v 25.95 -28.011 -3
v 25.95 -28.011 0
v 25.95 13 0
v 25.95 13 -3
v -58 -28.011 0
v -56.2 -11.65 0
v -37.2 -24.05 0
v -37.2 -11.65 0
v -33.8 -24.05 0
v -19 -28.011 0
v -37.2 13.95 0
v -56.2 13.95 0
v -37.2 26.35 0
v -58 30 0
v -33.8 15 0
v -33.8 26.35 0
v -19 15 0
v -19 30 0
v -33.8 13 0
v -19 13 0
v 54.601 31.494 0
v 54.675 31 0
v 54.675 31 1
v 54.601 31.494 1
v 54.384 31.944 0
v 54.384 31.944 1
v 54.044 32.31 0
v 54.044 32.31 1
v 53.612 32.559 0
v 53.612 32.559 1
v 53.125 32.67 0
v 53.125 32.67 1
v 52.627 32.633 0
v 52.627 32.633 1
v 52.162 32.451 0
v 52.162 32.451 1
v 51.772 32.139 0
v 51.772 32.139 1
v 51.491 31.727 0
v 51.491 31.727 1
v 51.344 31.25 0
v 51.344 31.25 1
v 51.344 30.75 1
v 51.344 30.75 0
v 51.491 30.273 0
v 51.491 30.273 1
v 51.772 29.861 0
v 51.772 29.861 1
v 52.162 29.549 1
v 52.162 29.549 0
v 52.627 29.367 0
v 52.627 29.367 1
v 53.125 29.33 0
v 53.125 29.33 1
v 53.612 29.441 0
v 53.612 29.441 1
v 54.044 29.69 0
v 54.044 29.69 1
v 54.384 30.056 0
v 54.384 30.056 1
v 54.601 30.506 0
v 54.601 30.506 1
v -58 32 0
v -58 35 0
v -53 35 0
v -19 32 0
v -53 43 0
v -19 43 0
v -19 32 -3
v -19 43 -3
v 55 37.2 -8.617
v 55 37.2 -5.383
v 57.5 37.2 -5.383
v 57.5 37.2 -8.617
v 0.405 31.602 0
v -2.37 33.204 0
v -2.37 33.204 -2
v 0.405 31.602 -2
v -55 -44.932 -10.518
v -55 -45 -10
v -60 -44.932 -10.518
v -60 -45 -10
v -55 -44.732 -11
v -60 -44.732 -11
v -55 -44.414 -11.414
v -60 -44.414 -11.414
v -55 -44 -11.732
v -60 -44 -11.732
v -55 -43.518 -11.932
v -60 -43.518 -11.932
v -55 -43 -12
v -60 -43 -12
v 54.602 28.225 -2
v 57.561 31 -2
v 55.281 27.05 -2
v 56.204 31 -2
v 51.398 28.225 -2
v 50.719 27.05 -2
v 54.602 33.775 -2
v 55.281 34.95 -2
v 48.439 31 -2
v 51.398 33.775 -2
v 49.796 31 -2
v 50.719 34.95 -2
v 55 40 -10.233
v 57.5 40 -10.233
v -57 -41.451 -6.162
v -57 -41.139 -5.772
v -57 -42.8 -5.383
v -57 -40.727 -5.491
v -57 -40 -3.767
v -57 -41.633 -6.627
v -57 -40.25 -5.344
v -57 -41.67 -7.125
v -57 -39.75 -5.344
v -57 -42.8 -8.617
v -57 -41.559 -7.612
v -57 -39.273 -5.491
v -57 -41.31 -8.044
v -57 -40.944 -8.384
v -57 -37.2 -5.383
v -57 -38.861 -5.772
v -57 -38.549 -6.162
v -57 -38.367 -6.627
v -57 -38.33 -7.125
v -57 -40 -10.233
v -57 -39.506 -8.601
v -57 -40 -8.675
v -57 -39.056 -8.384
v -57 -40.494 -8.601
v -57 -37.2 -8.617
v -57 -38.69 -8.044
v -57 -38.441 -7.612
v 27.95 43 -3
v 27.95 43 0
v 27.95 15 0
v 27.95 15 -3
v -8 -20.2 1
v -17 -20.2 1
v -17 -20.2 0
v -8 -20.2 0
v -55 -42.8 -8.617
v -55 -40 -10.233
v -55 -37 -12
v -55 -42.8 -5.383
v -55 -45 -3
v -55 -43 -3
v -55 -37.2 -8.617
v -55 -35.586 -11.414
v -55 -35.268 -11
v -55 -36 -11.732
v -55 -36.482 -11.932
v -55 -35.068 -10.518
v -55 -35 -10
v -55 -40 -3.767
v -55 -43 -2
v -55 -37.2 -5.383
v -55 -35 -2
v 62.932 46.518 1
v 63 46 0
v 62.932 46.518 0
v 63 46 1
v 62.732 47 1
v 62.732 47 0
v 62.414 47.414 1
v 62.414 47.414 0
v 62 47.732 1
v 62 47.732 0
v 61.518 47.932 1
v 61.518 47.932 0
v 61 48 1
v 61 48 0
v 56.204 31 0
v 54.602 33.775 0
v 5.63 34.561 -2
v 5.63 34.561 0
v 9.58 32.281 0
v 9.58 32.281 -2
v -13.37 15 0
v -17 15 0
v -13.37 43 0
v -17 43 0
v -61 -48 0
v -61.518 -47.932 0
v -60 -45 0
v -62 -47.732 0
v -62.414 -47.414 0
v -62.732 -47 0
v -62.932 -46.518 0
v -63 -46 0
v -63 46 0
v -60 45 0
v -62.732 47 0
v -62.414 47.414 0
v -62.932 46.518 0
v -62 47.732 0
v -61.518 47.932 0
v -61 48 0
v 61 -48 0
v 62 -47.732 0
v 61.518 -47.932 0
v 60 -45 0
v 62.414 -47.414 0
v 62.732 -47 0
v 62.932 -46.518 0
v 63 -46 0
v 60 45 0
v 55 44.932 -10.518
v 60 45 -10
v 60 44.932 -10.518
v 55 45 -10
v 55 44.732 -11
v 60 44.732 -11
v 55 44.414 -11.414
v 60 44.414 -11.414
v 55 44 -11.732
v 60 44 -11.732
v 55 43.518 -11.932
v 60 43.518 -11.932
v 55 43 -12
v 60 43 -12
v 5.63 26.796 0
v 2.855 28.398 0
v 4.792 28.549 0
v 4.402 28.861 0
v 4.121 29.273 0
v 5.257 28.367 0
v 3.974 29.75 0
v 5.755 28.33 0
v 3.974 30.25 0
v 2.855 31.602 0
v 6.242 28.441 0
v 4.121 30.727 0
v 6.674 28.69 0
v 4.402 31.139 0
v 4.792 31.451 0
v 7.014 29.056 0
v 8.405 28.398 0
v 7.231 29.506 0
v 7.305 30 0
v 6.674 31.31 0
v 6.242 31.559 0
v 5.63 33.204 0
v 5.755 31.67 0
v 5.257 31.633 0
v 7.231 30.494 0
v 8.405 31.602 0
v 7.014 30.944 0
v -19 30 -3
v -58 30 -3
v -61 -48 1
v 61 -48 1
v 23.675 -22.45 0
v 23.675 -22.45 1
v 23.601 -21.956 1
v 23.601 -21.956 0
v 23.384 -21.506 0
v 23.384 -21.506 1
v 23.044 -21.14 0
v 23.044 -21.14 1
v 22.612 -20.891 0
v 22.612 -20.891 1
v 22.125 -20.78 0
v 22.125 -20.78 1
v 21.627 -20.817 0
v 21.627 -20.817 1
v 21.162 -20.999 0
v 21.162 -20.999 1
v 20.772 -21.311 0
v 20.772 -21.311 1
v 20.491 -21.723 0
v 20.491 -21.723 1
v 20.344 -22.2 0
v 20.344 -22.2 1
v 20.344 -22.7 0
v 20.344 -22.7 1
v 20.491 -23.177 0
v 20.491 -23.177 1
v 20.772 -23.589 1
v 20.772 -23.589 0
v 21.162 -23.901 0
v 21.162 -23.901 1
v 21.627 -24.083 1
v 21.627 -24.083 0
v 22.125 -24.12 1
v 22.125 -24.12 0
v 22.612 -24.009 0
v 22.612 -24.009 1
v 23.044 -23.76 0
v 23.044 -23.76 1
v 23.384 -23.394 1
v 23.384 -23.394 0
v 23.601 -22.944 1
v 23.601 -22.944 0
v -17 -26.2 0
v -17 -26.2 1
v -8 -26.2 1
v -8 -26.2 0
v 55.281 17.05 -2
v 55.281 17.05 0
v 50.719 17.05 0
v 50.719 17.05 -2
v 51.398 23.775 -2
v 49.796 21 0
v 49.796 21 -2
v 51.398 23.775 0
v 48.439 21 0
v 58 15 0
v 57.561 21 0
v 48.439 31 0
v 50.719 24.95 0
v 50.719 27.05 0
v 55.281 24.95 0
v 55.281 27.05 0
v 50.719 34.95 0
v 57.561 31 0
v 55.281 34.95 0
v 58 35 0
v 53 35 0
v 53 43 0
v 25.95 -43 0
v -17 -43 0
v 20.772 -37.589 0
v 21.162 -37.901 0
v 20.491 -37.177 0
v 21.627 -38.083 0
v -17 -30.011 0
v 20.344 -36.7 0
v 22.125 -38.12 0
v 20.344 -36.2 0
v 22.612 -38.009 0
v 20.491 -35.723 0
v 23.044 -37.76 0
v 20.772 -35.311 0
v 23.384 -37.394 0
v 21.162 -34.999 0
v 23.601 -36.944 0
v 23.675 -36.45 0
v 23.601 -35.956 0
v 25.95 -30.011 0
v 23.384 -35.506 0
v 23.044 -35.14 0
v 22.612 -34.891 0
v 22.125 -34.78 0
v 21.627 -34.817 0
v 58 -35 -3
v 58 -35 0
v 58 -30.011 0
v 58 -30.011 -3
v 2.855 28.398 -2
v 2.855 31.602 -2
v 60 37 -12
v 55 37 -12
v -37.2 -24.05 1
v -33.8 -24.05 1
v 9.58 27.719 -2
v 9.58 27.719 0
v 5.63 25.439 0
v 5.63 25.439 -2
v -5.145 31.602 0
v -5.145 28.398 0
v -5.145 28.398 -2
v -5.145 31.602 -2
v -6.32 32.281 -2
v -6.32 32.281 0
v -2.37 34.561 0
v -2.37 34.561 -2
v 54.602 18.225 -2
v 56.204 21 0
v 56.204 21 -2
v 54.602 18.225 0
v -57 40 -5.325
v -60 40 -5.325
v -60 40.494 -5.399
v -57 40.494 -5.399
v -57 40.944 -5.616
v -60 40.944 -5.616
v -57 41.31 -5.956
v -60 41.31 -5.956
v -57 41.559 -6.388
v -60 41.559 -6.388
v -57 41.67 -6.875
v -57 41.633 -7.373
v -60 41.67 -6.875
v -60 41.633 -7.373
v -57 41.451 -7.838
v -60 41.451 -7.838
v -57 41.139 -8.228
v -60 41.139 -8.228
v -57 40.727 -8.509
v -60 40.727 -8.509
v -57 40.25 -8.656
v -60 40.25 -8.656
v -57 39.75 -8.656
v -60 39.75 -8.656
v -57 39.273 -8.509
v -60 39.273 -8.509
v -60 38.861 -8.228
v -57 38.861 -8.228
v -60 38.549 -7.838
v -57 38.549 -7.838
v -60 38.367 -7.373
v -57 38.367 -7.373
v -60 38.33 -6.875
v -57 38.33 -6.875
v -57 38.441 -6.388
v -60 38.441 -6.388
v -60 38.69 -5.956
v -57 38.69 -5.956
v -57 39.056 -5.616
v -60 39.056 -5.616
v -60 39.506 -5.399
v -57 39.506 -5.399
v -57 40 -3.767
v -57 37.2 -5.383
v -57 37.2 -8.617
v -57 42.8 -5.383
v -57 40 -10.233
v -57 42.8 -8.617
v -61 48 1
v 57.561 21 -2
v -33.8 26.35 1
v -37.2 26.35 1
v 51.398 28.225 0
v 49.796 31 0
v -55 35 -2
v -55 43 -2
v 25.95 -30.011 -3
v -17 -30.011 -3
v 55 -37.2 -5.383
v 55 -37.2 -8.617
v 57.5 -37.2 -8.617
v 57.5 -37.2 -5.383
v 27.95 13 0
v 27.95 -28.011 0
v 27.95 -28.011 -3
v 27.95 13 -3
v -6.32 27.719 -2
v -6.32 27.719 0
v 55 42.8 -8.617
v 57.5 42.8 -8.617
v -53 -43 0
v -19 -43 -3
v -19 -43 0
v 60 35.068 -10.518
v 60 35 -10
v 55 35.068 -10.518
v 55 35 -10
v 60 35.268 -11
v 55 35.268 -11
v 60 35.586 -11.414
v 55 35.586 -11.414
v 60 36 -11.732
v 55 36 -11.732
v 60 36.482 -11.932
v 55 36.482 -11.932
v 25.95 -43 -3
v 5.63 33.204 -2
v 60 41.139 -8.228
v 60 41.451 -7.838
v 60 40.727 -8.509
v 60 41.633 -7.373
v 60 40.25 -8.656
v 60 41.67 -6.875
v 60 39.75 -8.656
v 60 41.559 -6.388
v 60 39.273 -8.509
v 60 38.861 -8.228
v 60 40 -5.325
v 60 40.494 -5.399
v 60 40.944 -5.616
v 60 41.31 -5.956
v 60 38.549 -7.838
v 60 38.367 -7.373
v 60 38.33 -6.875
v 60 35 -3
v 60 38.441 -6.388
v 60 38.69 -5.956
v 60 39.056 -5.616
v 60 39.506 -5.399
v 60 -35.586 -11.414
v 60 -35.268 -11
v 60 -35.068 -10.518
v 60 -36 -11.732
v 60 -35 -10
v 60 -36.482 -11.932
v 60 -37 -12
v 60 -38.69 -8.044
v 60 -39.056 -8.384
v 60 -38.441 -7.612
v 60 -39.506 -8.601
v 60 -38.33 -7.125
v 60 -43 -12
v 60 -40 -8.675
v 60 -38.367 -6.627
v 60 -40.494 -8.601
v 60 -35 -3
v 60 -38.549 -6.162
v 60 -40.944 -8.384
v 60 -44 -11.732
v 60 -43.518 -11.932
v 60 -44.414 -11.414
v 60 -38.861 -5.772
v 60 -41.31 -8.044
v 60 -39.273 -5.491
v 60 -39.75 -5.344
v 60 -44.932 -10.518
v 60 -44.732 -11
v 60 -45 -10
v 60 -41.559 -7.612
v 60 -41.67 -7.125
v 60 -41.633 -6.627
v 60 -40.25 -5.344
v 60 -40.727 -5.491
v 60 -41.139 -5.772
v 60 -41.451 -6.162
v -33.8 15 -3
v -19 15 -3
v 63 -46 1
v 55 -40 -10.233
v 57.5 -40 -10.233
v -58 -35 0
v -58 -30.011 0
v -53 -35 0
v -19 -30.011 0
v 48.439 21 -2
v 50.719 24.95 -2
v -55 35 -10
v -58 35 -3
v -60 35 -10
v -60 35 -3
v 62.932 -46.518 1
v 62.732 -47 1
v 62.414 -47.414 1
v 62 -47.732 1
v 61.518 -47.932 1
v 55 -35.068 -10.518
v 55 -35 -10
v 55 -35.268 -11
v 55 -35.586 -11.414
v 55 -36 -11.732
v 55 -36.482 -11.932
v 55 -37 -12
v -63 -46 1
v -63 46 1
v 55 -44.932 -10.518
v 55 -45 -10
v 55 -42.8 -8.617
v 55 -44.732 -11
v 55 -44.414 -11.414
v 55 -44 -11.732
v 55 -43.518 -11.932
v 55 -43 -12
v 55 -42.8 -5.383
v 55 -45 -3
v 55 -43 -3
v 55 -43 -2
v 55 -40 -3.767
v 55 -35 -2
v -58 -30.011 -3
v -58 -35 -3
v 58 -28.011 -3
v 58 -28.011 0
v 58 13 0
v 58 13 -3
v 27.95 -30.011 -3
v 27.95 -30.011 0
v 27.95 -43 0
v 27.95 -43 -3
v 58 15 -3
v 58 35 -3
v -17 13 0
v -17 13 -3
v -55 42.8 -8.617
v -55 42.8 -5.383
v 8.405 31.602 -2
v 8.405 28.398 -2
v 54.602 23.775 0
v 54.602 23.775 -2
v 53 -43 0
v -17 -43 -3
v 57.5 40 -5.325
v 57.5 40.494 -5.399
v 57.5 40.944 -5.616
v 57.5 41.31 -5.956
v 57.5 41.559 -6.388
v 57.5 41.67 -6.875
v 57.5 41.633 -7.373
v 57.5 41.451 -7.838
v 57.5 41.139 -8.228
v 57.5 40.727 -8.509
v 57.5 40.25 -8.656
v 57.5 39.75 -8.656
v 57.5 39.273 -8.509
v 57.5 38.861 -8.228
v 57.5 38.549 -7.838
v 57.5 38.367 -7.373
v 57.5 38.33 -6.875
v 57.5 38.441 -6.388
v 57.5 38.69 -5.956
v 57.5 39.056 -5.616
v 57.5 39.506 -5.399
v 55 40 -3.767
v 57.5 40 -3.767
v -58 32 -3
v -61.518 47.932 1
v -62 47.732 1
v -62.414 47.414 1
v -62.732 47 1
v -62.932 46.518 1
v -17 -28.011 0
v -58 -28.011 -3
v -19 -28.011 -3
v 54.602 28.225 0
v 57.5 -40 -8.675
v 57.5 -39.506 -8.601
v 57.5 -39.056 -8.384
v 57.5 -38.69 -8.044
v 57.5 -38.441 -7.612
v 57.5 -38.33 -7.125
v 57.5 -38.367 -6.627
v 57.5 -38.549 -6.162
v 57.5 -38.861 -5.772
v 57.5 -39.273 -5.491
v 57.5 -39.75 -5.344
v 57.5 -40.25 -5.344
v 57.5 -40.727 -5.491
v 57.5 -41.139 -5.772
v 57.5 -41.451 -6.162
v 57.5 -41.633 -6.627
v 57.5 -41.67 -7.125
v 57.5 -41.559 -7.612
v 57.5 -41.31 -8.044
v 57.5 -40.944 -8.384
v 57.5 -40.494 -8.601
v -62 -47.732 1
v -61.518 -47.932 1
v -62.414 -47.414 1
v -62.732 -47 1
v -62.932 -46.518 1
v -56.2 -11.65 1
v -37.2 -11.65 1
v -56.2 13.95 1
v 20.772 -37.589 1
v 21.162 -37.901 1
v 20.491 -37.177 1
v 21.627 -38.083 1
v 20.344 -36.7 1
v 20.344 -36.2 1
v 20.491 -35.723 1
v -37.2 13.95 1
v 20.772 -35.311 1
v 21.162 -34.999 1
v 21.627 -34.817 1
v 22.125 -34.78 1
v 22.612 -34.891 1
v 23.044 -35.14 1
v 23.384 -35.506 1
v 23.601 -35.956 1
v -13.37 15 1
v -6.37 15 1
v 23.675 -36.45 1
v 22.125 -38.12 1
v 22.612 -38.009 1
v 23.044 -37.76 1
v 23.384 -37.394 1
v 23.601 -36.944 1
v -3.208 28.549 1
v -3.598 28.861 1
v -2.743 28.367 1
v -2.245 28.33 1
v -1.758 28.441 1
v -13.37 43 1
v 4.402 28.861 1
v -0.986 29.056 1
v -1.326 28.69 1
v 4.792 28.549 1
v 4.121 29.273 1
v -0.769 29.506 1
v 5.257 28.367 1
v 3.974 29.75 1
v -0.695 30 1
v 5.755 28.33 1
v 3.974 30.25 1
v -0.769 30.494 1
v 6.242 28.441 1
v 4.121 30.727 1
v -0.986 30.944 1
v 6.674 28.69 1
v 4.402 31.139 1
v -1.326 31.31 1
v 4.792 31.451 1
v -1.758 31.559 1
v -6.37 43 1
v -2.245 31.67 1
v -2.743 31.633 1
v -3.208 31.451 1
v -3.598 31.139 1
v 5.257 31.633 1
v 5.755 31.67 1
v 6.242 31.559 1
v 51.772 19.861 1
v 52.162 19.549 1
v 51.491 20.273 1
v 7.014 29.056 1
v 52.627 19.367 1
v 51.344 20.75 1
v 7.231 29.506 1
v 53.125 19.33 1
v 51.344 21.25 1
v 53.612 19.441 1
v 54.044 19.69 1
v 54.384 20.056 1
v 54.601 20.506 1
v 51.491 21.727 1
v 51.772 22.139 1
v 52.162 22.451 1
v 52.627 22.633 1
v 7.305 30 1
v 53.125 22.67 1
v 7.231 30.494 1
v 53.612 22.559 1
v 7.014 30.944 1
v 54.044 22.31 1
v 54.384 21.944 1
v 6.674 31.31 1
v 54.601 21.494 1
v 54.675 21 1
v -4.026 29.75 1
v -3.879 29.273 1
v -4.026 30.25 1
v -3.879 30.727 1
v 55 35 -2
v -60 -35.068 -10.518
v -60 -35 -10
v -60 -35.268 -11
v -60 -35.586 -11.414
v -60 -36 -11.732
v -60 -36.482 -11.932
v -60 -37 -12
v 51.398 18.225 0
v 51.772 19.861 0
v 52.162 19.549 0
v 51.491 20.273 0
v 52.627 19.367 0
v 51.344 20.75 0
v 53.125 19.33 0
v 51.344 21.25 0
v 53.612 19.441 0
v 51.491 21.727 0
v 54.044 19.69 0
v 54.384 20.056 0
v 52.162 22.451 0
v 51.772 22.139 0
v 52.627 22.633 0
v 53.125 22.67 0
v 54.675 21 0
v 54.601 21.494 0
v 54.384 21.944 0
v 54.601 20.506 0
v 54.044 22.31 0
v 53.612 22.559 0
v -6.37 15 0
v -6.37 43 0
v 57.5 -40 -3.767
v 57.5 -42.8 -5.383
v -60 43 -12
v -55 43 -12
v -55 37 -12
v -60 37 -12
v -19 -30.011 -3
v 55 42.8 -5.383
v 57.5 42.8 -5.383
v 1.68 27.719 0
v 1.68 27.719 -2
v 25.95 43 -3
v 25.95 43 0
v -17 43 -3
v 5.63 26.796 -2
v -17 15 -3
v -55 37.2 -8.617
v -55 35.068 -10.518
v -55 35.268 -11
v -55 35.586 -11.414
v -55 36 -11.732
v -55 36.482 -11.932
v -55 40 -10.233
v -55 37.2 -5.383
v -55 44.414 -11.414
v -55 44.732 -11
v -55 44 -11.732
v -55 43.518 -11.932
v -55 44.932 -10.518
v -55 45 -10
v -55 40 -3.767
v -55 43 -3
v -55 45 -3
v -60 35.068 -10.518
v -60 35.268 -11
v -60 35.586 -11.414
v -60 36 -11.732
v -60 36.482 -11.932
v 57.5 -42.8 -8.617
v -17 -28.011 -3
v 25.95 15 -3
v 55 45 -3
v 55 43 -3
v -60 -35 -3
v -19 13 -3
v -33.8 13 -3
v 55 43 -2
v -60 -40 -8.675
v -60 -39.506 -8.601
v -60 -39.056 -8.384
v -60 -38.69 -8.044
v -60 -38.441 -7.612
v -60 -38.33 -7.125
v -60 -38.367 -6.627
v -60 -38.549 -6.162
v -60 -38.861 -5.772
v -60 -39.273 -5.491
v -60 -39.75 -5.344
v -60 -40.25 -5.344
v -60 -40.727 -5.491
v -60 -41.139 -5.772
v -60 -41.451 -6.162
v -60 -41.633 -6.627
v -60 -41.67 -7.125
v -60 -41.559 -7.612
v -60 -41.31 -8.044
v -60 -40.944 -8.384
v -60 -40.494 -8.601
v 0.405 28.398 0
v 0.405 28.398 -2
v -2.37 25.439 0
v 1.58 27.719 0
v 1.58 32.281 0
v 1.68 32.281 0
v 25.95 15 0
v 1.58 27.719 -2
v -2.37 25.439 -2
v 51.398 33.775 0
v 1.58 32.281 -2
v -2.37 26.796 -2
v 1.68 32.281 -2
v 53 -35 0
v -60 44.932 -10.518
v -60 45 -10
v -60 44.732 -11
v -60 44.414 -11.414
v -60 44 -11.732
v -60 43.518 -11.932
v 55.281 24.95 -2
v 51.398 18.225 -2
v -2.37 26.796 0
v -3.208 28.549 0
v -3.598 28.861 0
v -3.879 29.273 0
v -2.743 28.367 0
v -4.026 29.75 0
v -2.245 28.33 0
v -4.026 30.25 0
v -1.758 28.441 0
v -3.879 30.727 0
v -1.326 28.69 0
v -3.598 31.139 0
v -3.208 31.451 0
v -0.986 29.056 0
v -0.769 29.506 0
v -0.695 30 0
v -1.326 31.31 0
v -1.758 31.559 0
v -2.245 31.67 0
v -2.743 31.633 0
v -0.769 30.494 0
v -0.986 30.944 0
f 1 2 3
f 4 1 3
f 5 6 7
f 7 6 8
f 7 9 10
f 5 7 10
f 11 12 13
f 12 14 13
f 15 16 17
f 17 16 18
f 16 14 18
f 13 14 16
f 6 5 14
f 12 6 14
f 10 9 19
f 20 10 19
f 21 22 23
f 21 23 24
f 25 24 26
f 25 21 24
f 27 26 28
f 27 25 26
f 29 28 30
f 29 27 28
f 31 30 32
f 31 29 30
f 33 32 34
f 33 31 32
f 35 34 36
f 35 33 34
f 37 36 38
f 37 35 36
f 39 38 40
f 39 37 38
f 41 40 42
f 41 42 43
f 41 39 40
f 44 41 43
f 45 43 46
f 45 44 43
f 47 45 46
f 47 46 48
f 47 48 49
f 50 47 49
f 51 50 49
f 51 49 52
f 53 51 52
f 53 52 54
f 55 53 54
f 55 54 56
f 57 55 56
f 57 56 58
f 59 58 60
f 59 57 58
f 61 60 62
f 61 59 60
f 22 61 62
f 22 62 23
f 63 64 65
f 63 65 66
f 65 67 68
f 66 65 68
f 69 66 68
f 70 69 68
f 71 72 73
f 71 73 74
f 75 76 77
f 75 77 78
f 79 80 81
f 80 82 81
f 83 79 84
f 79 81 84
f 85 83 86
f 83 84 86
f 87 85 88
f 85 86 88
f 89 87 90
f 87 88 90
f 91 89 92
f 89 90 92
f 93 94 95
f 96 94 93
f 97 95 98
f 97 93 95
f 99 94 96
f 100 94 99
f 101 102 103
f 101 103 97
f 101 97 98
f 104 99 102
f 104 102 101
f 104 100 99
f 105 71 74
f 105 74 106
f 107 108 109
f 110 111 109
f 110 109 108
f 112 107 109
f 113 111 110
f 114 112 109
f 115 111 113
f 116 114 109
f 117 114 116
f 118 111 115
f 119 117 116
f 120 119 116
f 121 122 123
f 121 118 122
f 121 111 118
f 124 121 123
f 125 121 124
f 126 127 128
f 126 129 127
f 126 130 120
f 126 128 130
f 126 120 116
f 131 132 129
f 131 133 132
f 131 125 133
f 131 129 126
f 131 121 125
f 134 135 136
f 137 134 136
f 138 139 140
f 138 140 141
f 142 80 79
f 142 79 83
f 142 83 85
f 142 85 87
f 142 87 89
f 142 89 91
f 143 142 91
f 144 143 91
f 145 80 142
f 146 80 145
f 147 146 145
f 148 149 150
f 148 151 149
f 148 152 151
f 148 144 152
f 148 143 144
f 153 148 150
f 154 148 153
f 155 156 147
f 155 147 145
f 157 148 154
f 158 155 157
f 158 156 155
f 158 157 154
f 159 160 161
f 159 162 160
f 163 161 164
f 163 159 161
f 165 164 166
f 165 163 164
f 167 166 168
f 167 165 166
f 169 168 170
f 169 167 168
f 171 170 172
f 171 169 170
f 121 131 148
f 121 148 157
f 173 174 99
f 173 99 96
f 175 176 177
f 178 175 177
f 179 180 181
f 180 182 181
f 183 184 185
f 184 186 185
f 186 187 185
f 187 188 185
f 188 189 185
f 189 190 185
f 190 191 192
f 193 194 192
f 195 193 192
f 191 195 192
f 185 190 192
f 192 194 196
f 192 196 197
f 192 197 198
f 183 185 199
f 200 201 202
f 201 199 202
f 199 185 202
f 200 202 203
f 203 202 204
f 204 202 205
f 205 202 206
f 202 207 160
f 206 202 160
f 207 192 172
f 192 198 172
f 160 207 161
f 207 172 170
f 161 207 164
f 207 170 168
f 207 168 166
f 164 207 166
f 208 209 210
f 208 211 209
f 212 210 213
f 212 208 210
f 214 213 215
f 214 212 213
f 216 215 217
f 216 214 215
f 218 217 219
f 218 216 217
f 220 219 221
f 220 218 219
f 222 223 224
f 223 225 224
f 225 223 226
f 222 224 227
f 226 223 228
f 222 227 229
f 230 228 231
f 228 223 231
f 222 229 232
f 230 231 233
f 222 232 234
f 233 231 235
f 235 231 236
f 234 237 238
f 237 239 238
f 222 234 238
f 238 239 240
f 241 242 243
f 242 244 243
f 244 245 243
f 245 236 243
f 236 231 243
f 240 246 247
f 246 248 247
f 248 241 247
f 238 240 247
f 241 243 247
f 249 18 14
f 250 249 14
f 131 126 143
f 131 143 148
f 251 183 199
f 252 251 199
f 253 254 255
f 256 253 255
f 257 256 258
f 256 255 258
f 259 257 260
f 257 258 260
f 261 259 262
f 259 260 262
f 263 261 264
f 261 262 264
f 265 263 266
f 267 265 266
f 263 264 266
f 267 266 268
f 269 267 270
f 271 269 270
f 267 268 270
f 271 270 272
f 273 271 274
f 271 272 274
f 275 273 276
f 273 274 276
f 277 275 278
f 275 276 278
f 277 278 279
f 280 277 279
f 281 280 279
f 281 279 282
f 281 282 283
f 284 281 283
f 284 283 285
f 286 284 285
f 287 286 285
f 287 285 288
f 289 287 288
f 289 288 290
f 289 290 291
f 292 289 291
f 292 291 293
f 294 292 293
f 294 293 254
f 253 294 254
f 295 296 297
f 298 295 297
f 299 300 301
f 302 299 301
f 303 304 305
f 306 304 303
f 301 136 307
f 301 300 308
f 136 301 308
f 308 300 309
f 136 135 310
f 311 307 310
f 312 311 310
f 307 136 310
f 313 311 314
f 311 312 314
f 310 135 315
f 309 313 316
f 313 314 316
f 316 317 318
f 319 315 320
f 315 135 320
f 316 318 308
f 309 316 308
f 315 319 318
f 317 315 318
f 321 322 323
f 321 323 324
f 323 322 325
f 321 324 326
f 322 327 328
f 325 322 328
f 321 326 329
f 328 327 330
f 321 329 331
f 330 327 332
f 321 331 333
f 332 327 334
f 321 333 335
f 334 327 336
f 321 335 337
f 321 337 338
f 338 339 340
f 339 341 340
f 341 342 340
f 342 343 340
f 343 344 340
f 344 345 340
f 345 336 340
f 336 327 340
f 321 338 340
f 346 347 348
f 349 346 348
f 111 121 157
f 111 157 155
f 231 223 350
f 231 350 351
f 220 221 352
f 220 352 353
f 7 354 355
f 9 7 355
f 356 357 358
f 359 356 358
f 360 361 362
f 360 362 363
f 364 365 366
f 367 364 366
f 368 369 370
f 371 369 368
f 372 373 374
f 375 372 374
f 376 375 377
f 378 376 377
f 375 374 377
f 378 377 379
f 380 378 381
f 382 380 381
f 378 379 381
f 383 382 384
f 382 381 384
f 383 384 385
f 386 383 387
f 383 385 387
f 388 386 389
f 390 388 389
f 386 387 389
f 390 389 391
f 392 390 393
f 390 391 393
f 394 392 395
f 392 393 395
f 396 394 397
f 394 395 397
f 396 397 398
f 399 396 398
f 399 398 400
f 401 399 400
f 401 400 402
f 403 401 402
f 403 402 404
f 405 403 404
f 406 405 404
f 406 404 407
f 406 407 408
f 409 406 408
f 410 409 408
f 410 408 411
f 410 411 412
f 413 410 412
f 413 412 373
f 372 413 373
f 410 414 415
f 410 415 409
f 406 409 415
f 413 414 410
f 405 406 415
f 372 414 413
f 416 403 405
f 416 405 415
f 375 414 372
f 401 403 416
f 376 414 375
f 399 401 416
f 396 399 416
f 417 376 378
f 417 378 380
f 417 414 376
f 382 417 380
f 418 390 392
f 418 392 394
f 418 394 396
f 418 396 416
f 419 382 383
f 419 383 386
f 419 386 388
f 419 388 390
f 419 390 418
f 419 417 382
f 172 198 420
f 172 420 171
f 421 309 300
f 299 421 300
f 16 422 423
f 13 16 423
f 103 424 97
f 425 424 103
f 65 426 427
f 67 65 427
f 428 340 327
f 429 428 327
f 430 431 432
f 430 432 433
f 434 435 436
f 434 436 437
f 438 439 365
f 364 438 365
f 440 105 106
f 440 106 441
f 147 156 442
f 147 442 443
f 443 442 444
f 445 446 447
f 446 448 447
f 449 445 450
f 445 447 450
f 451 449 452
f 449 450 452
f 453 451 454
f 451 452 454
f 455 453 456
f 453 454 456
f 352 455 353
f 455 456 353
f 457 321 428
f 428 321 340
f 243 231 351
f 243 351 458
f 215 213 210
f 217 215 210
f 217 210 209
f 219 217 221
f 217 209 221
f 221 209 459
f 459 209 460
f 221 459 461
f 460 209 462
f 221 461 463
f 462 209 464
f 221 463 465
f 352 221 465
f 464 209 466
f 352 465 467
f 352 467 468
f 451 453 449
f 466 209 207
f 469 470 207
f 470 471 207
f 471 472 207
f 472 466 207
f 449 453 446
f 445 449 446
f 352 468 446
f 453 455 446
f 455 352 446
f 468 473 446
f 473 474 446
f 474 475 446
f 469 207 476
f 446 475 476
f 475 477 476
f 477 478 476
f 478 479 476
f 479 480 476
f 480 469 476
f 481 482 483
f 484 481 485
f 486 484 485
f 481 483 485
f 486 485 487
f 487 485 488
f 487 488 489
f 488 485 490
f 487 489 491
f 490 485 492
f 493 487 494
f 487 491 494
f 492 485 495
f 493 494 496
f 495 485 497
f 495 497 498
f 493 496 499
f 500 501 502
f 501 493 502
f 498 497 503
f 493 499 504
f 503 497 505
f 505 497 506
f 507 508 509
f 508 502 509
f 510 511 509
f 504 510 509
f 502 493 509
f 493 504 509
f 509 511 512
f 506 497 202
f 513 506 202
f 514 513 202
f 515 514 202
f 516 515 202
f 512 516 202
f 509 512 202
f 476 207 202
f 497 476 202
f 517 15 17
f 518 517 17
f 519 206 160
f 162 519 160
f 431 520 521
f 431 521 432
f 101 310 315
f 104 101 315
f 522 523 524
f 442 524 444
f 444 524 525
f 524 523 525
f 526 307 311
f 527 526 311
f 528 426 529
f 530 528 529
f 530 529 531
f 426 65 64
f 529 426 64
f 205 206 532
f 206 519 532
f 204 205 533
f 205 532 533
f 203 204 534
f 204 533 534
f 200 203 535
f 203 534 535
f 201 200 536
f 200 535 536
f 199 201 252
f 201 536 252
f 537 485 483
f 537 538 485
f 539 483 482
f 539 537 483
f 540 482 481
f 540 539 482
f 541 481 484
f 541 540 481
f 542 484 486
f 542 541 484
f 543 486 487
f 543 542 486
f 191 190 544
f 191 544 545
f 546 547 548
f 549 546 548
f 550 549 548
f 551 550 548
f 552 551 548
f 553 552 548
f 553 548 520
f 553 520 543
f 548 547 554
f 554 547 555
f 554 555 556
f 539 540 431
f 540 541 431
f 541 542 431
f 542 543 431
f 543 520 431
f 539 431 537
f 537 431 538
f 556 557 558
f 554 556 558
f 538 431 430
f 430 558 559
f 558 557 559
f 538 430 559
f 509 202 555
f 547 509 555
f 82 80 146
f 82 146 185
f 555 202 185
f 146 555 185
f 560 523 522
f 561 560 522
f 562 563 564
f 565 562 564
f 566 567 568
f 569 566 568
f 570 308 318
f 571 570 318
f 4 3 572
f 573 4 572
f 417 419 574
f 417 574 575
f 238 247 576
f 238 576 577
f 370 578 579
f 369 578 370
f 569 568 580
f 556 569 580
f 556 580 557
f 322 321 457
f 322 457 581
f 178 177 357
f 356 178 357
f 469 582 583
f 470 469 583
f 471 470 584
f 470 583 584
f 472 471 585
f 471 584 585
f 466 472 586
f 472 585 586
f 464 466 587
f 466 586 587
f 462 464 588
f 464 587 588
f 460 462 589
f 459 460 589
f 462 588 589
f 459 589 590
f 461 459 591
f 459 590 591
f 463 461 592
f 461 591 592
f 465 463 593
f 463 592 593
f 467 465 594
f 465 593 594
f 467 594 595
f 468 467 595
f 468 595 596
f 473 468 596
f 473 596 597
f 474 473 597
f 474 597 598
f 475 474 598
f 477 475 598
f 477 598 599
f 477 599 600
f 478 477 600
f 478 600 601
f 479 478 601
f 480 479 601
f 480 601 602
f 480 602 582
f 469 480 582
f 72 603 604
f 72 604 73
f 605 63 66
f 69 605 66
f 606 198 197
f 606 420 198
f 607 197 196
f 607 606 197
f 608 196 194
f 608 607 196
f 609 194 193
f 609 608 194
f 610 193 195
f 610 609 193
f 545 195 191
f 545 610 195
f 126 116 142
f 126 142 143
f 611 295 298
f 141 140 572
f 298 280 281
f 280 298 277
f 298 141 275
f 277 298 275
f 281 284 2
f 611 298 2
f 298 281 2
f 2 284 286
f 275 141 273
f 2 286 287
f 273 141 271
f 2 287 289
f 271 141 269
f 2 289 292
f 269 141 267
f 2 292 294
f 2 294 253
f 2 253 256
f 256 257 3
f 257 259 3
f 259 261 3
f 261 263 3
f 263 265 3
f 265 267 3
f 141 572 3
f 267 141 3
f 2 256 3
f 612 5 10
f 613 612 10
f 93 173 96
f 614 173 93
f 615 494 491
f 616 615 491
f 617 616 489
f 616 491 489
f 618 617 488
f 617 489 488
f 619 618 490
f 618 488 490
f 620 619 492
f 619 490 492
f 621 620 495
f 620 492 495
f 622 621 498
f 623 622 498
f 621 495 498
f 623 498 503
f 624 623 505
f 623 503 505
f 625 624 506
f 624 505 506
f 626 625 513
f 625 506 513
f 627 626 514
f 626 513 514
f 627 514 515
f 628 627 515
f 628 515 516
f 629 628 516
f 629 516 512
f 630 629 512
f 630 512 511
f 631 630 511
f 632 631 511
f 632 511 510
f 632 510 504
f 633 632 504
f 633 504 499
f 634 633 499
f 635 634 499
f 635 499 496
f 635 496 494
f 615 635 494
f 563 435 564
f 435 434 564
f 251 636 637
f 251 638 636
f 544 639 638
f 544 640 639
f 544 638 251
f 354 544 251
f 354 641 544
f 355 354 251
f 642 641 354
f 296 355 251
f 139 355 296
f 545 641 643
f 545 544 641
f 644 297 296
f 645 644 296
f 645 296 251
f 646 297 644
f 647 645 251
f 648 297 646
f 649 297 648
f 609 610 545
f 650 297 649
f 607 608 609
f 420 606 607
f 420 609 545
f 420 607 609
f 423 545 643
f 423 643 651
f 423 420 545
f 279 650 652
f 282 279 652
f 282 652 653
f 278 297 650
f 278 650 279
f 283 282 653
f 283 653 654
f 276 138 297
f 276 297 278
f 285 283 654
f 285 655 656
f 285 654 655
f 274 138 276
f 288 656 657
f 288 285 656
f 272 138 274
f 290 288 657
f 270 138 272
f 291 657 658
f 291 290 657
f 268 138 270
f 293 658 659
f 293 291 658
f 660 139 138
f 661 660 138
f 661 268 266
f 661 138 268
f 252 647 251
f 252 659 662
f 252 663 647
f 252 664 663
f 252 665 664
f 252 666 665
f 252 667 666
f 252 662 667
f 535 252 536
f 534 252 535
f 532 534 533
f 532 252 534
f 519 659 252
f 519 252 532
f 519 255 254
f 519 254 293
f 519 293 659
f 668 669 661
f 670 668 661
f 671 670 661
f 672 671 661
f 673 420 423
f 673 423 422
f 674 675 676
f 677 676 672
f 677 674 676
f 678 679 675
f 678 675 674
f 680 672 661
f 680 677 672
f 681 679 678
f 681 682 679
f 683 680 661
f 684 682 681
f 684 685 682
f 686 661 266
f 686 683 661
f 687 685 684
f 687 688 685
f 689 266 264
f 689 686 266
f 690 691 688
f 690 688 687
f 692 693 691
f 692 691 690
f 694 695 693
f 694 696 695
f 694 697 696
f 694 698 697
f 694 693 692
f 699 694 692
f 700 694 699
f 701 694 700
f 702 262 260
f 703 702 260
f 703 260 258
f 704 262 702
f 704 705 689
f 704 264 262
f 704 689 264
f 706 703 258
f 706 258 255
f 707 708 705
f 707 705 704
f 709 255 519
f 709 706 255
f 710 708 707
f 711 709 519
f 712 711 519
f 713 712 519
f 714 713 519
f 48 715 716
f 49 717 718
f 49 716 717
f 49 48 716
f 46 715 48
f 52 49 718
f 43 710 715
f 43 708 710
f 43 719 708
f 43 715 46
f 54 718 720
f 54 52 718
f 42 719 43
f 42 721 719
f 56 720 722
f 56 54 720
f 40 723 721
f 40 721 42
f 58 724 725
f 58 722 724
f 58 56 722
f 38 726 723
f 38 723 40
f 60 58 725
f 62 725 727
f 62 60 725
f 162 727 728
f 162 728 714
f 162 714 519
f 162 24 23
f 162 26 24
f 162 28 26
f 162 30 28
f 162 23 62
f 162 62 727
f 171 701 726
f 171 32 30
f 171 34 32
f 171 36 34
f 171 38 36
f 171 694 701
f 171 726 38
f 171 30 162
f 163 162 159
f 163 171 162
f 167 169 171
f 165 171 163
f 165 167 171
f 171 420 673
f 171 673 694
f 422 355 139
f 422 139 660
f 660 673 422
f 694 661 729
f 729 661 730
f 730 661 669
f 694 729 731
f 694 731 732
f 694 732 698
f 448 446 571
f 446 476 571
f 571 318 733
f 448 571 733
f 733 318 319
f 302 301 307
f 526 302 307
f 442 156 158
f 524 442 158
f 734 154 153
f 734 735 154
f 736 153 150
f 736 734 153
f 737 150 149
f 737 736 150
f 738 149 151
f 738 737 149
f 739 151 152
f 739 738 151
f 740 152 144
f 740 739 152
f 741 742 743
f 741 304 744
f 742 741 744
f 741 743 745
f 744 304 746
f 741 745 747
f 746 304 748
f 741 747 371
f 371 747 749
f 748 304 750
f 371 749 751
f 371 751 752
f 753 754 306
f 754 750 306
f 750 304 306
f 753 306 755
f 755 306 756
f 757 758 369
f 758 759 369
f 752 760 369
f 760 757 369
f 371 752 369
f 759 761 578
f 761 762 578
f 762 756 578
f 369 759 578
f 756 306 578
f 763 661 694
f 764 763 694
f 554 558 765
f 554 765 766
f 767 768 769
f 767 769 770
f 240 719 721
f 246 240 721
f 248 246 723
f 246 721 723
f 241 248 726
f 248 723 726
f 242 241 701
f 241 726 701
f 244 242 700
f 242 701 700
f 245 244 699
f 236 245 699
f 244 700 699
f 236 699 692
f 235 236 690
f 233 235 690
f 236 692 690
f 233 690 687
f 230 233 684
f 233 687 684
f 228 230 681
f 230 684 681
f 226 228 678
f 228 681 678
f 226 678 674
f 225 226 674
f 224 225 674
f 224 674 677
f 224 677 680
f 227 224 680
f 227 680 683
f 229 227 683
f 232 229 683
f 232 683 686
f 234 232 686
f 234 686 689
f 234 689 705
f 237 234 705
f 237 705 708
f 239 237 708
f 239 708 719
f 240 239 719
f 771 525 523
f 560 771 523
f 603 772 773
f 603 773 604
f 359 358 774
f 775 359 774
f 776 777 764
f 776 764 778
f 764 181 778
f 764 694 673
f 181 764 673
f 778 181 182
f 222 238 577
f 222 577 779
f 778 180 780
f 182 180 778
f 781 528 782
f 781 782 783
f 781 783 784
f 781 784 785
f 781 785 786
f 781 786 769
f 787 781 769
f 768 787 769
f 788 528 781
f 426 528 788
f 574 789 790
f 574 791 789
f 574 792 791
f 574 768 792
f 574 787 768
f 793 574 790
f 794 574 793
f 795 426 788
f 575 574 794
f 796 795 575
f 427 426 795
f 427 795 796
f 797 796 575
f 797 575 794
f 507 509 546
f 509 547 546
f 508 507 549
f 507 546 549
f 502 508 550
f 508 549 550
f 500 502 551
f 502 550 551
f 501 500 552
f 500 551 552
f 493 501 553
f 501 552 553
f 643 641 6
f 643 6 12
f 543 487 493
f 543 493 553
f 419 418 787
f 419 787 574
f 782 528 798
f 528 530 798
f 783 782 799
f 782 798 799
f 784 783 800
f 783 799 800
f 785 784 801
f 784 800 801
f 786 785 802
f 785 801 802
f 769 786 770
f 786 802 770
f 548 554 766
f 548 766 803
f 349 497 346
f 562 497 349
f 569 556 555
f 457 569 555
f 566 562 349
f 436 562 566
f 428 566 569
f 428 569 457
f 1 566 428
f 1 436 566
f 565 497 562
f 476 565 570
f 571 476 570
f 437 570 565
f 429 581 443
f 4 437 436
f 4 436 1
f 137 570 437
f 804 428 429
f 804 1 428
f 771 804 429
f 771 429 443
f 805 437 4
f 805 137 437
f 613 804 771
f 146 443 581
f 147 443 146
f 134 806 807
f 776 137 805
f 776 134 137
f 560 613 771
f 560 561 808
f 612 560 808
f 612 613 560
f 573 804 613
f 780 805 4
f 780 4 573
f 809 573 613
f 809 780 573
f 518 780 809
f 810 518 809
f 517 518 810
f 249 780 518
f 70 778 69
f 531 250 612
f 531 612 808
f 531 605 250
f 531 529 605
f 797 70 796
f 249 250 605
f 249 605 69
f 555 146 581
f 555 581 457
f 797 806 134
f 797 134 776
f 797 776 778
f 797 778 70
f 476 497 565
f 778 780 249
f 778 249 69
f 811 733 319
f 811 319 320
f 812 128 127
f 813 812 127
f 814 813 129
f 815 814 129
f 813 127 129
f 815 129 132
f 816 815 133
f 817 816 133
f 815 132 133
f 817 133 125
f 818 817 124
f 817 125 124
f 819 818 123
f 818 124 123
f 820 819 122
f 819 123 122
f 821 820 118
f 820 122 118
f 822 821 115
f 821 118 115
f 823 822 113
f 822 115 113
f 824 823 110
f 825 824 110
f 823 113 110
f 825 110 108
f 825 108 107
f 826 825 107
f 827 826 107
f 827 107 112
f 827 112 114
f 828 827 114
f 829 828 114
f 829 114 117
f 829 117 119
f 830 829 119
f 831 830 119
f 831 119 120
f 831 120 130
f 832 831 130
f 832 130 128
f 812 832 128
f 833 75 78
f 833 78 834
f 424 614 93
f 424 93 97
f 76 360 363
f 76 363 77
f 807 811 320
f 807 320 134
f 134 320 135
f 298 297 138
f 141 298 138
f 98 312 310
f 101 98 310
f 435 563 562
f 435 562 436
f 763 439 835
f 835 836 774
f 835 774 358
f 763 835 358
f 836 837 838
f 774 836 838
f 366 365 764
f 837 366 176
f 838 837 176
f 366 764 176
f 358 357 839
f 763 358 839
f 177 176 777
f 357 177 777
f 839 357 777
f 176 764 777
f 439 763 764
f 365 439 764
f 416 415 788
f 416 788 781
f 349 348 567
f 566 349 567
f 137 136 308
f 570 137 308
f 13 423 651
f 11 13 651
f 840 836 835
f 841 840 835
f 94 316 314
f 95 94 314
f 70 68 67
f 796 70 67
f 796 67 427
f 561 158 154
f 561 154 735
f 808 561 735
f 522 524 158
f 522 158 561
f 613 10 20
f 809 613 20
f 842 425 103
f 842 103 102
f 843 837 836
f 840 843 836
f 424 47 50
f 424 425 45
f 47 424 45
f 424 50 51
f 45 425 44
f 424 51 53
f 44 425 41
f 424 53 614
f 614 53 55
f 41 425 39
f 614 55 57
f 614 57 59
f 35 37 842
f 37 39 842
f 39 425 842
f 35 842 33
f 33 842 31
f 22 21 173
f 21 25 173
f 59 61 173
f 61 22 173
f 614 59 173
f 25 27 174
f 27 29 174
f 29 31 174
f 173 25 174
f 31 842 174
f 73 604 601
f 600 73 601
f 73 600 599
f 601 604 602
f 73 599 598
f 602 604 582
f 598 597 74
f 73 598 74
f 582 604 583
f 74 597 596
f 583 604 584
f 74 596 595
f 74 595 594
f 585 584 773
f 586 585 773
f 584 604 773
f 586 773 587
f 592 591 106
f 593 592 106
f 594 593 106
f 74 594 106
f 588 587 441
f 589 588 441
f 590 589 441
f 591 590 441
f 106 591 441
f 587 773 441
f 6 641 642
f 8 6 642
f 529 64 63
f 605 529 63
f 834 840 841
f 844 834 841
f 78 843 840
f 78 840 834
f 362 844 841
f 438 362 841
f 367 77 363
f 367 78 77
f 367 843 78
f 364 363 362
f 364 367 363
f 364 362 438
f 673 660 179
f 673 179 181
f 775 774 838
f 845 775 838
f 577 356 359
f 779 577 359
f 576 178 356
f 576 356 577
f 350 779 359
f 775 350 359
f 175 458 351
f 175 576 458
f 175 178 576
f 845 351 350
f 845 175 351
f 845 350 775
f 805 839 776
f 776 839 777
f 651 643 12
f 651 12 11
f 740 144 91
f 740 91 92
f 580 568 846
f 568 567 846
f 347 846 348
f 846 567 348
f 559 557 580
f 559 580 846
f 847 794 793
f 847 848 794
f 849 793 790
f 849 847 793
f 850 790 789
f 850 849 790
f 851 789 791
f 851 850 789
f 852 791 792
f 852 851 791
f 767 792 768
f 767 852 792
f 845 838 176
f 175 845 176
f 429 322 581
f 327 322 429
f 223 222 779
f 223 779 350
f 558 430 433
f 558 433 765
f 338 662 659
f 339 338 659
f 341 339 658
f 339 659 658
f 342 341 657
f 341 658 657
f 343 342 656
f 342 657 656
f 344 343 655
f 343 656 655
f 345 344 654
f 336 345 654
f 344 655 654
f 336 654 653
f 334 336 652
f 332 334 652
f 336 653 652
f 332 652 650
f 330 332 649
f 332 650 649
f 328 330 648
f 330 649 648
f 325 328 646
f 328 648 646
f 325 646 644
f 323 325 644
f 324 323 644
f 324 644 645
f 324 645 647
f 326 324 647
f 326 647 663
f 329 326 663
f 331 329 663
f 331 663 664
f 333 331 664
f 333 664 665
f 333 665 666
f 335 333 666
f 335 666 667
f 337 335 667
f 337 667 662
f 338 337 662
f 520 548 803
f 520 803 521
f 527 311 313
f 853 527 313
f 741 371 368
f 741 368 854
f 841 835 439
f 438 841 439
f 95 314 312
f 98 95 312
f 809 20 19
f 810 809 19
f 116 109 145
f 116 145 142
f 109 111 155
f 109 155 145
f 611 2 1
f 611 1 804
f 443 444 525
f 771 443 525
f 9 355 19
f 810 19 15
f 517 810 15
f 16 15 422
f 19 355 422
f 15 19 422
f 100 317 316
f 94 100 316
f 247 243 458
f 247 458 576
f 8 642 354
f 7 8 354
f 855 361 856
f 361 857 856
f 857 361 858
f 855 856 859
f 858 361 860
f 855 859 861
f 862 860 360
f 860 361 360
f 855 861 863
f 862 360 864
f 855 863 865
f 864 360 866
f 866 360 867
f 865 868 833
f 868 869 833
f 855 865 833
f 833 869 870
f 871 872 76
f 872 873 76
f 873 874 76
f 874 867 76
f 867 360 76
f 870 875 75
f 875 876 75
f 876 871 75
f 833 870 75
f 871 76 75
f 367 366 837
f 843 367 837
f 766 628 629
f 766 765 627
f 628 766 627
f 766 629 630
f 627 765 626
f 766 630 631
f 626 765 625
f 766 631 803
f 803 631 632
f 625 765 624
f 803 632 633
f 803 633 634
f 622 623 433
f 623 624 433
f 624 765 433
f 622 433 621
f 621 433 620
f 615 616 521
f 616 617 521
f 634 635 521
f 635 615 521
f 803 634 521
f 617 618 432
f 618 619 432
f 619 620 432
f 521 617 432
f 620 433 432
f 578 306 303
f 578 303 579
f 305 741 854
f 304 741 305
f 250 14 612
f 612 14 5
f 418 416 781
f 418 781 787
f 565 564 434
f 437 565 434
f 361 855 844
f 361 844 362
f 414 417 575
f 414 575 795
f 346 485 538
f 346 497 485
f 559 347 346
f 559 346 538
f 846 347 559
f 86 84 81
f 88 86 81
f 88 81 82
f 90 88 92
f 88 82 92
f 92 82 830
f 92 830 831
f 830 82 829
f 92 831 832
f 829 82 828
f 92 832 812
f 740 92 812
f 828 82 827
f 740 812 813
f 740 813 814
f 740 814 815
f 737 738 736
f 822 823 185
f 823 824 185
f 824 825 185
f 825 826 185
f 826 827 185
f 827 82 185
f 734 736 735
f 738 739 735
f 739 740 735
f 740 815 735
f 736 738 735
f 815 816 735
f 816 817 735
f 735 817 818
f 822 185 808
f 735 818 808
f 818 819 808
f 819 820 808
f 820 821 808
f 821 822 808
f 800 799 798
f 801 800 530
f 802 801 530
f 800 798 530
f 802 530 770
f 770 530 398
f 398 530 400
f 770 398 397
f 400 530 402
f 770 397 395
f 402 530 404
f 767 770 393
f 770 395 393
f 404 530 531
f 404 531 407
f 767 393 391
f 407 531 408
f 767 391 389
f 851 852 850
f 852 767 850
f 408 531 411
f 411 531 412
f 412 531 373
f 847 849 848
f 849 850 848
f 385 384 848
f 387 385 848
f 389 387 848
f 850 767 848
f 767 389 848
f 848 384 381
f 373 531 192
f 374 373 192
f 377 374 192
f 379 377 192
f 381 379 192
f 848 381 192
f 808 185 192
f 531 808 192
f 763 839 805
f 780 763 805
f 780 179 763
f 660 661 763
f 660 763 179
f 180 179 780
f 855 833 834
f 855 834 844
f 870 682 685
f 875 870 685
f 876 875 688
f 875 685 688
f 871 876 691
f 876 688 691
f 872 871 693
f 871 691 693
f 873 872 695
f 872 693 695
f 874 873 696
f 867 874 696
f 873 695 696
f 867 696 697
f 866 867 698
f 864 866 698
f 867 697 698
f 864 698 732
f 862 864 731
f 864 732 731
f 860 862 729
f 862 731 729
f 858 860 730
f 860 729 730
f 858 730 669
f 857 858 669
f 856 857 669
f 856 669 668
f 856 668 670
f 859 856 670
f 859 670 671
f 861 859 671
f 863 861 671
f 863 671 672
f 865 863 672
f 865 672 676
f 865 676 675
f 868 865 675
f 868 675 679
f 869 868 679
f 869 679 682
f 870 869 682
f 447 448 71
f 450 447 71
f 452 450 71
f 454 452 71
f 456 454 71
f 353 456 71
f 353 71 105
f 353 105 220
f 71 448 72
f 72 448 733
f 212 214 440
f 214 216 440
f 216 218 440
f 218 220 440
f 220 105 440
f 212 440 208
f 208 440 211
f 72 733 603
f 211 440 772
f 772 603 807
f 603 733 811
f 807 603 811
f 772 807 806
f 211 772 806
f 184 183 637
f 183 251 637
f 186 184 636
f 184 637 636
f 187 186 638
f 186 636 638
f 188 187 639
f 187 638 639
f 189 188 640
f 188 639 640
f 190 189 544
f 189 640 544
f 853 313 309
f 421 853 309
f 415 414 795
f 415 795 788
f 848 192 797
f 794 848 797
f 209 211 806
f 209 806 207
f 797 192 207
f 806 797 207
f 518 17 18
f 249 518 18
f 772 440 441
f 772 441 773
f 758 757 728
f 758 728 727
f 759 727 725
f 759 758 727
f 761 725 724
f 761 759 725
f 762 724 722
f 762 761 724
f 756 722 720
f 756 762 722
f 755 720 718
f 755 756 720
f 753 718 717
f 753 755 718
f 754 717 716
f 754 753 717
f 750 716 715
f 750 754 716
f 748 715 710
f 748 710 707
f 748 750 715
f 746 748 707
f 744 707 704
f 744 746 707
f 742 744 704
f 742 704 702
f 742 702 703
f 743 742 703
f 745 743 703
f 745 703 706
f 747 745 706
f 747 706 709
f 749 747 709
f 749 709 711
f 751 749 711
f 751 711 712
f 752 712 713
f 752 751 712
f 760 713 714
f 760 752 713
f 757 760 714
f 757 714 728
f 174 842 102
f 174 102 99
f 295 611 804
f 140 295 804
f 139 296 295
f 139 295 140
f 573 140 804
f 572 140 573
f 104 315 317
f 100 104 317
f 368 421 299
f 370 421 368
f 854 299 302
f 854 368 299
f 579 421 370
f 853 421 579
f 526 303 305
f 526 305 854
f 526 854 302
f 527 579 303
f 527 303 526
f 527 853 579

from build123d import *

# Parameters (mm, degrees)
SKETCH1_W            = 126
SKETCH1_H            = 96
SKETCH1_R            = 1.675
BOSS_EXTRUDE1_DEPTH  = 1
SKETCH2_W            = 5
SKETCH2_H            = 10
BOSS_EXTRUDE2_DEPTH  = 12
CUT_EXTRUDE1_REACH   = 134.578
SKETCH3_R            = 1.675
CUT_EXTRUDE2_START   = -2
CUT_EXTRUDE2_DEPTH   = 114.5
CHAMFER1_SIZE        = 2
CUT_EXTRUDE3_REACH   = 134.578
SKETCH5_R            = 1.675
CUT_EXTRUDE4_START   = -2
CUT_EXTRUDE4_DEPTH   = 114.5
SKETCH7_R            = 1.675
CUT_EXTRUDE5_DEPTH   = 10
SKETCH9_W            = 7
SKETCH9_H            = 28
CUT_EXTRUDE7_DEPTH   = 10
SKETCH11_R           = 1.675
SKETCH11_W           = 9
SKETCH11_H           = 6
CUT_EXTRUDE8_DEPTH   = 10
BOSS_EXTRUDE3_DEPTH  = 2
SKETCH24_W           = 19
SKETCH24_H           = 25.6
CUT_EXTRUDE17_DEPTH  = 2
FILLET1_R            = 2
SKETCH26_W           = 42.95
SKETCH26_H           = 12.988932873
SKETCH26_W_2         = 30.05
SKETCH26_H_2         = 41.011067127
SKETCH26_H_3         = 28
BOSS_EXTRUDE10_DEPTH = 3
FILLET2_R            = 2


with BuildPart() as part:
    # Sketch1 → Boss-Extrude1 (new body)
    with BuildSketch(Plane.XY):
        Rectangle(SKETCH1_W, SKETCH1_H)
        with Locations((53, 31)):
            Circle(SKETCH1_R, mode=Mode.SUBTRACT)
        with Locations((53, 21)):
            Circle(SKETCH1_R, mode=Mode.SUBTRACT)
    extrude(amount=BOSS_EXTRUDE1_DEPTH)

    # Sketch2 → Boss-Extrude2 (add)
    with BuildSketch(Plane(origin=(0, 0, 0), x_dir=(-1, 0, 0), z_dir=(0, 0, -1))):
        with Locations((-57.5, 40)):
            Rectangle(SKETCH2_W, SKETCH2_H)
        with Locations((57.5, 40)):
            Rectangle(SKETCH2_W, SKETCH2_H)
        with Locations((-57.5, -40)):
            Rectangle(SKETCH2_W, SKETCH2_H)
        with Locations((57.5, -40)):
            Rectangle(SKETCH2_W, SKETCH2_H)
    extrude(amount=BOSS_EXTRUDE2_DEPTH)

    # Cut-Extrude1: up to this face of the body (flat: up to its plane)
    cut_extrude1_end = Plane(part.part.faces().sort_by_distance((60, 40, -6))[0])
    # Sketch3 → Cut-Extrude1 (cut, up to the picked face)
    with BuildSketch(Plane.ZY.offset(60), mode=Mode.PRIVATE) as cut_extrude1_sk1:
        with Locations((-7, 40)):
            Circle(SKETCH3_R)
    cut_extrude1_tool1 = split(extrude(cut_extrude1_sk1.sketch, amount=-CUT_EXTRUDE1_REACH, mode=Mode.PRIVATE), bisect_by=cut_extrude1_end, keep=Keep.BOTH, mode=Mode.PRIVATE)
    add(cut_extrude1_tool1.solids().sort_by(Axis((-60, 40, -7), (1, 0, 0)))[0], mode=Mode.SUBTRACT)

    # Sketch4 → Cut-Extrude2 (cut)
    with BuildSketch(Plane(origin=(-55, 0, 0), x_dir=(0, 0, -1), z_dir=(1, 0, 0)).offset(CUT_EXTRUDE2_START)):
        Polygon((8.616580754, 42.8), (5.383419246, 42.8), (3.766838493, 40), (5.383419246, 37.2), (8.616580754, 37.2), (10.233161507, 40), align=None)
    extrude(amount=CUT_EXTRUDE2_DEPTH, mode=Mode.SUBTRACT)

    # Chamfer1
    chamfer1_edges = [part.edges().sort_by_distance(p)[0] for p in [
        (55, 40, 0),
        (-55, 40, 0),
        (55, -40, 0),
        (-55, -40, 0),
    ]]
    chamfer(chamfer1_edges, length=CHAMFER1_SIZE)

    # Cut-Extrude3: up to this face of the body (flat: up to its plane)
    cut_extrude3_end = Plane(part.part.faces().sort_by_distance((-60, -40, -6))[0])
    # Sketch5 → Cut-Extrude3 (cut, up to the picked face)
    with BuildSketch(Plane(origin=(60, 0, 0), x_dir=(0, 0, -1), z_dir=(1, 0, 0)), mode=Mode.PRIVATE) as cut_extrude3_sk1:
        with Locations((7, -40)):
            Circle(SKETCH5_R)
    cut_extrude3_tool1 = split(extrude(cut_extrude3_sk1.sketch, amount=-CUT_EXTRUDE3_REACH, mode=Mode.PRIVATE), bisect_by=cut_extrude3_end, keep=Keep.BOTH, mode=Mode.PRIVATE)
    add(cut_extrude3_tool1.solids().sort_by(Axis((60, -40, -7), (-1, 0, 0)))[0], mode=Mode.SUBTRACT)

    # Sketch6 → Cut-Extrude4 (cut)
    with BuildSketch(Plane(origin=(-55, 0, 0), x_dir=(0, 0, -1), z_dir=(1, 0, 0)).offset(CUT_EXTRUDE4_START)):
        Polygon((8.616580754, -37.2), (5.383419246, -37.2), (3.766838493, -40), (5.383419246, -42.8), (8.616580754, -42.8), (10.233161507, -40), align=None)
    extrude(amount=CUT_EXTRUDE4_DEPTH, mode=Mode.SUBTRACT)

    # Sketch7 → Cut-Extrude5 (cut)
    with BuildSketch(Plane.XY.offset(1)):
        with Locations((5.63, 30)):
            Circle(SKETCH7_R)
        with Locations((-2.37, 30)):
            Circle(SKETCH7_R)
    extrude(amount=-CUT_EXTRUDE5_DEPTH, mode=Mode.SUBTRACT)

    # Sketch9 → Cut-Extrude7 (cut)
    with BuildSketch(Plane.XY.offset(1)):
        with Locations((-9.87, 29)):
            Rectangle(SKETCH9_W, SKETCH9_H)
    extrude(amount=-CUT_EXTRUDE7_DEPTH, mode=Mode.SUBTRACT)

    # Sketch11 → Cut-Extrude8 (cut)
    with BuildSketch(Plane.XY.offset(1)):
        with Locations((22, -36.45)):
            Circle(SKETCH11_R)
        with Locations((22, -22.45)):
            Circle(SKETCH11_R)
        with Locations((-12.5, -23.2)):
            Rectangle(SKETCH11_W, SKETCH11_H)
    extrude(amount=-CUT_EXTRUDE8_DEPTH, mode=Mode.SUBTRACT)

    # Sketch21 → Boss-Extrude3 (add)
    # profile 1 of 4: a face of its own
    with BuildSketch(Plane(origin=(0, 0, 0), x_dir=(-1, 0, 0), z_dir=(0, 0, -1))):
        Polygon((-50.719466437, 24.95), (-55.280533563, 24.95), (-57.561067127, 21), (-55.280533563, 17.05), (-50.719466437, 17.05), (-48.438932873, 21), align=None)
        Polygon((-51.397853003, 23.775), (-54.602146997, 23.775), (-56.204293994, 21), (-54.602146997, 18.225), (-51.397853003, 18.225), (-49.795706006, 21), align=None, mode=Mode.SUBTRACT)
    # profile 2 of 4: a face of its own
    with BuildSketch(Plane(origin=(0, 0, 0), x_dir=(-1, 0, 0), z_dir=(0, 0, -1))):
        Polygon((-50.719466437, 34.95), (-55.280533563, 34.95), (-57.561067127, 31), (-55.280533563, 27.05), (-50.719466437, 27.05), (-48.438932873, 31), align=None)
        Polygon((-51.397853003, 33.775), (-54.602146997, 33.775), (-56.204293994, 31), (-54.602146997, 28.225), (-51.397853003, 28.225), (-49.795706006, 31), align=None, mode=Mode.SUBTRACT)
    # profile 3 of 4: a face of its own
    with BuildSketch(Plane(origin=(0, 0, 0), x_dir=(-1, 0, 0), z_dir=(0, 0, -1))):
        Polygon((6.32, 32.280533563), (2.37, 34.561067127), (-1.58, 32.280533563), (-1.58, 27.719466437), (2.37, 25.438932873), (6.32, 27.719466437), align=None)
        Polygon((5.145, 31.602146997), (2.37, 33.204293994), (-0.405, 31.602146997), (-0.405, 28.397853003), (2.37, 26.795706006), (5.145, 28.397853003), align=None, mode=Mode.SUBTRACT)
    # profile 4 of 4: a face of its own
    with BuildSketch(Plane(origin=(0, 0, 0), x_dir=(-1, 0, 0), z_dir=(0, 0, -1))):
        Polygon((-1.68, 32.280533563), (-5.63, 34.561067127), (-9.58, 32.280533563), (-9.58, 27.719466437), (-5.63, 25.438932873), (-1.68, 27.719466437), align=None)
        Polygon((-2.855, 31.602146997), (-5.63, 33.204293994), (-8.405, 31.602146997), (-8.405, 28.397853003), (-5.63, 26.795706006), (-2.855, 28.397853003), align=None, mode=Mode.SUBTRACT)
    extrude(amount=BOSS_EXTRUDE3_DEPTH)

    # Sketch24 → Cut-Extrude17 (cut)
    with BuildSketch(Plane.XY.offset(1)):
        with Locations((-46.7, 1.15)):
            Rectangle(SKETCH24_W, SKETCH24_H)
        Polygon((-37.2, 26.35), (-37.2, 13.95), (-37.2, -11.65), (-37.2, -24.05), (-33.8, -24.05), (-33.8, 26.35), align=None)
    extrude(amount=-CUT_EXTRUDE17_DEPTH, mode=Mode.SUBTRACT)

    # Fillet1
    fillet1_edges = [part.edges().sort_by_distance(p)[0] for p in [
        (57.5, 45, -12),
        (57.5, 35, -12),
        (-57.5, 45, -12),
        (-57.5, 35, -12),
        (57.5, -35, -12),
        (57.5, -45, -12),
        (-57.5, -35, -12),
        (-57.5, -45, -12),
    ]]
    fillet(fillet1_edges, radius=FILLET1_R)

    # Sketch26 → Boss-Extrude10 (add)
    with BuildSketch(Plane(origin=(0, 0, 0), x_dir=(-1, 0, 0), z_dir=(0, 0, -1))):
        Polygon((-27.95, -30.011067127), (-27.95, -43), (-55, -43), (-55, -45), (55, -45), (55, -43), (19, -43), (19, -30.011067127), (58, -30.011067127), (58, -35), (60, -35), (60, 35), (58, 35), (58, 32), (19, 32), (19, 43), (60, 43), (60, 45), (-60, 45), (-60, 43), (-27.95, 43), (-27.95, 15), (-58, 15), (-58, 35), (-60, 35), (-60, -35), (-58, -35), (-58, -30.011067127), align=None)
        with Locations((-4.475, -36.505533564)):
            Rectangle(SKETCH26_W, SKETCH26_H, mode=Mode.SUBTRACT)
        with Locations((-42.975, -7.505533564)):
            Rectangle(SKETCH26_W_2, SKETCH26_H_2, mode=Mode.SUBTRACT)
        with Locations((-4.475, -7.505533564)):
            Rectangle(SKETCH26_W, SKETCH26_H_2, mode=Mode.SUBTRACT)
        with Locations((-4.475, 29)):
            Rectangle(SKETCH26_W, SKETCH26_H_3, mode=Mode.SUBTRACT)
        Polygon((19, 15), (19, 30), (58, 30), (58, -28.011067127), (19, -28.011067127), (19, 13), (33.8, 13), (33.8, 15), align=None, mode=Mode.SUBTRACT)
    extrude(amount=BOSS_EXTRUDE10_DEPTH)

    # Fillet2
    fillet2_edges = [part.edges().sort_by_distance(p)[0] for p in [
        (-63, 48, 0.5),
        (63, 48, 0.5),
        (63, -48, 0.5),
        (-63, -48, 0.5),
    ]]
    fillet(fillet2_edges, radius=FILLET2_R)


solid = part.part
